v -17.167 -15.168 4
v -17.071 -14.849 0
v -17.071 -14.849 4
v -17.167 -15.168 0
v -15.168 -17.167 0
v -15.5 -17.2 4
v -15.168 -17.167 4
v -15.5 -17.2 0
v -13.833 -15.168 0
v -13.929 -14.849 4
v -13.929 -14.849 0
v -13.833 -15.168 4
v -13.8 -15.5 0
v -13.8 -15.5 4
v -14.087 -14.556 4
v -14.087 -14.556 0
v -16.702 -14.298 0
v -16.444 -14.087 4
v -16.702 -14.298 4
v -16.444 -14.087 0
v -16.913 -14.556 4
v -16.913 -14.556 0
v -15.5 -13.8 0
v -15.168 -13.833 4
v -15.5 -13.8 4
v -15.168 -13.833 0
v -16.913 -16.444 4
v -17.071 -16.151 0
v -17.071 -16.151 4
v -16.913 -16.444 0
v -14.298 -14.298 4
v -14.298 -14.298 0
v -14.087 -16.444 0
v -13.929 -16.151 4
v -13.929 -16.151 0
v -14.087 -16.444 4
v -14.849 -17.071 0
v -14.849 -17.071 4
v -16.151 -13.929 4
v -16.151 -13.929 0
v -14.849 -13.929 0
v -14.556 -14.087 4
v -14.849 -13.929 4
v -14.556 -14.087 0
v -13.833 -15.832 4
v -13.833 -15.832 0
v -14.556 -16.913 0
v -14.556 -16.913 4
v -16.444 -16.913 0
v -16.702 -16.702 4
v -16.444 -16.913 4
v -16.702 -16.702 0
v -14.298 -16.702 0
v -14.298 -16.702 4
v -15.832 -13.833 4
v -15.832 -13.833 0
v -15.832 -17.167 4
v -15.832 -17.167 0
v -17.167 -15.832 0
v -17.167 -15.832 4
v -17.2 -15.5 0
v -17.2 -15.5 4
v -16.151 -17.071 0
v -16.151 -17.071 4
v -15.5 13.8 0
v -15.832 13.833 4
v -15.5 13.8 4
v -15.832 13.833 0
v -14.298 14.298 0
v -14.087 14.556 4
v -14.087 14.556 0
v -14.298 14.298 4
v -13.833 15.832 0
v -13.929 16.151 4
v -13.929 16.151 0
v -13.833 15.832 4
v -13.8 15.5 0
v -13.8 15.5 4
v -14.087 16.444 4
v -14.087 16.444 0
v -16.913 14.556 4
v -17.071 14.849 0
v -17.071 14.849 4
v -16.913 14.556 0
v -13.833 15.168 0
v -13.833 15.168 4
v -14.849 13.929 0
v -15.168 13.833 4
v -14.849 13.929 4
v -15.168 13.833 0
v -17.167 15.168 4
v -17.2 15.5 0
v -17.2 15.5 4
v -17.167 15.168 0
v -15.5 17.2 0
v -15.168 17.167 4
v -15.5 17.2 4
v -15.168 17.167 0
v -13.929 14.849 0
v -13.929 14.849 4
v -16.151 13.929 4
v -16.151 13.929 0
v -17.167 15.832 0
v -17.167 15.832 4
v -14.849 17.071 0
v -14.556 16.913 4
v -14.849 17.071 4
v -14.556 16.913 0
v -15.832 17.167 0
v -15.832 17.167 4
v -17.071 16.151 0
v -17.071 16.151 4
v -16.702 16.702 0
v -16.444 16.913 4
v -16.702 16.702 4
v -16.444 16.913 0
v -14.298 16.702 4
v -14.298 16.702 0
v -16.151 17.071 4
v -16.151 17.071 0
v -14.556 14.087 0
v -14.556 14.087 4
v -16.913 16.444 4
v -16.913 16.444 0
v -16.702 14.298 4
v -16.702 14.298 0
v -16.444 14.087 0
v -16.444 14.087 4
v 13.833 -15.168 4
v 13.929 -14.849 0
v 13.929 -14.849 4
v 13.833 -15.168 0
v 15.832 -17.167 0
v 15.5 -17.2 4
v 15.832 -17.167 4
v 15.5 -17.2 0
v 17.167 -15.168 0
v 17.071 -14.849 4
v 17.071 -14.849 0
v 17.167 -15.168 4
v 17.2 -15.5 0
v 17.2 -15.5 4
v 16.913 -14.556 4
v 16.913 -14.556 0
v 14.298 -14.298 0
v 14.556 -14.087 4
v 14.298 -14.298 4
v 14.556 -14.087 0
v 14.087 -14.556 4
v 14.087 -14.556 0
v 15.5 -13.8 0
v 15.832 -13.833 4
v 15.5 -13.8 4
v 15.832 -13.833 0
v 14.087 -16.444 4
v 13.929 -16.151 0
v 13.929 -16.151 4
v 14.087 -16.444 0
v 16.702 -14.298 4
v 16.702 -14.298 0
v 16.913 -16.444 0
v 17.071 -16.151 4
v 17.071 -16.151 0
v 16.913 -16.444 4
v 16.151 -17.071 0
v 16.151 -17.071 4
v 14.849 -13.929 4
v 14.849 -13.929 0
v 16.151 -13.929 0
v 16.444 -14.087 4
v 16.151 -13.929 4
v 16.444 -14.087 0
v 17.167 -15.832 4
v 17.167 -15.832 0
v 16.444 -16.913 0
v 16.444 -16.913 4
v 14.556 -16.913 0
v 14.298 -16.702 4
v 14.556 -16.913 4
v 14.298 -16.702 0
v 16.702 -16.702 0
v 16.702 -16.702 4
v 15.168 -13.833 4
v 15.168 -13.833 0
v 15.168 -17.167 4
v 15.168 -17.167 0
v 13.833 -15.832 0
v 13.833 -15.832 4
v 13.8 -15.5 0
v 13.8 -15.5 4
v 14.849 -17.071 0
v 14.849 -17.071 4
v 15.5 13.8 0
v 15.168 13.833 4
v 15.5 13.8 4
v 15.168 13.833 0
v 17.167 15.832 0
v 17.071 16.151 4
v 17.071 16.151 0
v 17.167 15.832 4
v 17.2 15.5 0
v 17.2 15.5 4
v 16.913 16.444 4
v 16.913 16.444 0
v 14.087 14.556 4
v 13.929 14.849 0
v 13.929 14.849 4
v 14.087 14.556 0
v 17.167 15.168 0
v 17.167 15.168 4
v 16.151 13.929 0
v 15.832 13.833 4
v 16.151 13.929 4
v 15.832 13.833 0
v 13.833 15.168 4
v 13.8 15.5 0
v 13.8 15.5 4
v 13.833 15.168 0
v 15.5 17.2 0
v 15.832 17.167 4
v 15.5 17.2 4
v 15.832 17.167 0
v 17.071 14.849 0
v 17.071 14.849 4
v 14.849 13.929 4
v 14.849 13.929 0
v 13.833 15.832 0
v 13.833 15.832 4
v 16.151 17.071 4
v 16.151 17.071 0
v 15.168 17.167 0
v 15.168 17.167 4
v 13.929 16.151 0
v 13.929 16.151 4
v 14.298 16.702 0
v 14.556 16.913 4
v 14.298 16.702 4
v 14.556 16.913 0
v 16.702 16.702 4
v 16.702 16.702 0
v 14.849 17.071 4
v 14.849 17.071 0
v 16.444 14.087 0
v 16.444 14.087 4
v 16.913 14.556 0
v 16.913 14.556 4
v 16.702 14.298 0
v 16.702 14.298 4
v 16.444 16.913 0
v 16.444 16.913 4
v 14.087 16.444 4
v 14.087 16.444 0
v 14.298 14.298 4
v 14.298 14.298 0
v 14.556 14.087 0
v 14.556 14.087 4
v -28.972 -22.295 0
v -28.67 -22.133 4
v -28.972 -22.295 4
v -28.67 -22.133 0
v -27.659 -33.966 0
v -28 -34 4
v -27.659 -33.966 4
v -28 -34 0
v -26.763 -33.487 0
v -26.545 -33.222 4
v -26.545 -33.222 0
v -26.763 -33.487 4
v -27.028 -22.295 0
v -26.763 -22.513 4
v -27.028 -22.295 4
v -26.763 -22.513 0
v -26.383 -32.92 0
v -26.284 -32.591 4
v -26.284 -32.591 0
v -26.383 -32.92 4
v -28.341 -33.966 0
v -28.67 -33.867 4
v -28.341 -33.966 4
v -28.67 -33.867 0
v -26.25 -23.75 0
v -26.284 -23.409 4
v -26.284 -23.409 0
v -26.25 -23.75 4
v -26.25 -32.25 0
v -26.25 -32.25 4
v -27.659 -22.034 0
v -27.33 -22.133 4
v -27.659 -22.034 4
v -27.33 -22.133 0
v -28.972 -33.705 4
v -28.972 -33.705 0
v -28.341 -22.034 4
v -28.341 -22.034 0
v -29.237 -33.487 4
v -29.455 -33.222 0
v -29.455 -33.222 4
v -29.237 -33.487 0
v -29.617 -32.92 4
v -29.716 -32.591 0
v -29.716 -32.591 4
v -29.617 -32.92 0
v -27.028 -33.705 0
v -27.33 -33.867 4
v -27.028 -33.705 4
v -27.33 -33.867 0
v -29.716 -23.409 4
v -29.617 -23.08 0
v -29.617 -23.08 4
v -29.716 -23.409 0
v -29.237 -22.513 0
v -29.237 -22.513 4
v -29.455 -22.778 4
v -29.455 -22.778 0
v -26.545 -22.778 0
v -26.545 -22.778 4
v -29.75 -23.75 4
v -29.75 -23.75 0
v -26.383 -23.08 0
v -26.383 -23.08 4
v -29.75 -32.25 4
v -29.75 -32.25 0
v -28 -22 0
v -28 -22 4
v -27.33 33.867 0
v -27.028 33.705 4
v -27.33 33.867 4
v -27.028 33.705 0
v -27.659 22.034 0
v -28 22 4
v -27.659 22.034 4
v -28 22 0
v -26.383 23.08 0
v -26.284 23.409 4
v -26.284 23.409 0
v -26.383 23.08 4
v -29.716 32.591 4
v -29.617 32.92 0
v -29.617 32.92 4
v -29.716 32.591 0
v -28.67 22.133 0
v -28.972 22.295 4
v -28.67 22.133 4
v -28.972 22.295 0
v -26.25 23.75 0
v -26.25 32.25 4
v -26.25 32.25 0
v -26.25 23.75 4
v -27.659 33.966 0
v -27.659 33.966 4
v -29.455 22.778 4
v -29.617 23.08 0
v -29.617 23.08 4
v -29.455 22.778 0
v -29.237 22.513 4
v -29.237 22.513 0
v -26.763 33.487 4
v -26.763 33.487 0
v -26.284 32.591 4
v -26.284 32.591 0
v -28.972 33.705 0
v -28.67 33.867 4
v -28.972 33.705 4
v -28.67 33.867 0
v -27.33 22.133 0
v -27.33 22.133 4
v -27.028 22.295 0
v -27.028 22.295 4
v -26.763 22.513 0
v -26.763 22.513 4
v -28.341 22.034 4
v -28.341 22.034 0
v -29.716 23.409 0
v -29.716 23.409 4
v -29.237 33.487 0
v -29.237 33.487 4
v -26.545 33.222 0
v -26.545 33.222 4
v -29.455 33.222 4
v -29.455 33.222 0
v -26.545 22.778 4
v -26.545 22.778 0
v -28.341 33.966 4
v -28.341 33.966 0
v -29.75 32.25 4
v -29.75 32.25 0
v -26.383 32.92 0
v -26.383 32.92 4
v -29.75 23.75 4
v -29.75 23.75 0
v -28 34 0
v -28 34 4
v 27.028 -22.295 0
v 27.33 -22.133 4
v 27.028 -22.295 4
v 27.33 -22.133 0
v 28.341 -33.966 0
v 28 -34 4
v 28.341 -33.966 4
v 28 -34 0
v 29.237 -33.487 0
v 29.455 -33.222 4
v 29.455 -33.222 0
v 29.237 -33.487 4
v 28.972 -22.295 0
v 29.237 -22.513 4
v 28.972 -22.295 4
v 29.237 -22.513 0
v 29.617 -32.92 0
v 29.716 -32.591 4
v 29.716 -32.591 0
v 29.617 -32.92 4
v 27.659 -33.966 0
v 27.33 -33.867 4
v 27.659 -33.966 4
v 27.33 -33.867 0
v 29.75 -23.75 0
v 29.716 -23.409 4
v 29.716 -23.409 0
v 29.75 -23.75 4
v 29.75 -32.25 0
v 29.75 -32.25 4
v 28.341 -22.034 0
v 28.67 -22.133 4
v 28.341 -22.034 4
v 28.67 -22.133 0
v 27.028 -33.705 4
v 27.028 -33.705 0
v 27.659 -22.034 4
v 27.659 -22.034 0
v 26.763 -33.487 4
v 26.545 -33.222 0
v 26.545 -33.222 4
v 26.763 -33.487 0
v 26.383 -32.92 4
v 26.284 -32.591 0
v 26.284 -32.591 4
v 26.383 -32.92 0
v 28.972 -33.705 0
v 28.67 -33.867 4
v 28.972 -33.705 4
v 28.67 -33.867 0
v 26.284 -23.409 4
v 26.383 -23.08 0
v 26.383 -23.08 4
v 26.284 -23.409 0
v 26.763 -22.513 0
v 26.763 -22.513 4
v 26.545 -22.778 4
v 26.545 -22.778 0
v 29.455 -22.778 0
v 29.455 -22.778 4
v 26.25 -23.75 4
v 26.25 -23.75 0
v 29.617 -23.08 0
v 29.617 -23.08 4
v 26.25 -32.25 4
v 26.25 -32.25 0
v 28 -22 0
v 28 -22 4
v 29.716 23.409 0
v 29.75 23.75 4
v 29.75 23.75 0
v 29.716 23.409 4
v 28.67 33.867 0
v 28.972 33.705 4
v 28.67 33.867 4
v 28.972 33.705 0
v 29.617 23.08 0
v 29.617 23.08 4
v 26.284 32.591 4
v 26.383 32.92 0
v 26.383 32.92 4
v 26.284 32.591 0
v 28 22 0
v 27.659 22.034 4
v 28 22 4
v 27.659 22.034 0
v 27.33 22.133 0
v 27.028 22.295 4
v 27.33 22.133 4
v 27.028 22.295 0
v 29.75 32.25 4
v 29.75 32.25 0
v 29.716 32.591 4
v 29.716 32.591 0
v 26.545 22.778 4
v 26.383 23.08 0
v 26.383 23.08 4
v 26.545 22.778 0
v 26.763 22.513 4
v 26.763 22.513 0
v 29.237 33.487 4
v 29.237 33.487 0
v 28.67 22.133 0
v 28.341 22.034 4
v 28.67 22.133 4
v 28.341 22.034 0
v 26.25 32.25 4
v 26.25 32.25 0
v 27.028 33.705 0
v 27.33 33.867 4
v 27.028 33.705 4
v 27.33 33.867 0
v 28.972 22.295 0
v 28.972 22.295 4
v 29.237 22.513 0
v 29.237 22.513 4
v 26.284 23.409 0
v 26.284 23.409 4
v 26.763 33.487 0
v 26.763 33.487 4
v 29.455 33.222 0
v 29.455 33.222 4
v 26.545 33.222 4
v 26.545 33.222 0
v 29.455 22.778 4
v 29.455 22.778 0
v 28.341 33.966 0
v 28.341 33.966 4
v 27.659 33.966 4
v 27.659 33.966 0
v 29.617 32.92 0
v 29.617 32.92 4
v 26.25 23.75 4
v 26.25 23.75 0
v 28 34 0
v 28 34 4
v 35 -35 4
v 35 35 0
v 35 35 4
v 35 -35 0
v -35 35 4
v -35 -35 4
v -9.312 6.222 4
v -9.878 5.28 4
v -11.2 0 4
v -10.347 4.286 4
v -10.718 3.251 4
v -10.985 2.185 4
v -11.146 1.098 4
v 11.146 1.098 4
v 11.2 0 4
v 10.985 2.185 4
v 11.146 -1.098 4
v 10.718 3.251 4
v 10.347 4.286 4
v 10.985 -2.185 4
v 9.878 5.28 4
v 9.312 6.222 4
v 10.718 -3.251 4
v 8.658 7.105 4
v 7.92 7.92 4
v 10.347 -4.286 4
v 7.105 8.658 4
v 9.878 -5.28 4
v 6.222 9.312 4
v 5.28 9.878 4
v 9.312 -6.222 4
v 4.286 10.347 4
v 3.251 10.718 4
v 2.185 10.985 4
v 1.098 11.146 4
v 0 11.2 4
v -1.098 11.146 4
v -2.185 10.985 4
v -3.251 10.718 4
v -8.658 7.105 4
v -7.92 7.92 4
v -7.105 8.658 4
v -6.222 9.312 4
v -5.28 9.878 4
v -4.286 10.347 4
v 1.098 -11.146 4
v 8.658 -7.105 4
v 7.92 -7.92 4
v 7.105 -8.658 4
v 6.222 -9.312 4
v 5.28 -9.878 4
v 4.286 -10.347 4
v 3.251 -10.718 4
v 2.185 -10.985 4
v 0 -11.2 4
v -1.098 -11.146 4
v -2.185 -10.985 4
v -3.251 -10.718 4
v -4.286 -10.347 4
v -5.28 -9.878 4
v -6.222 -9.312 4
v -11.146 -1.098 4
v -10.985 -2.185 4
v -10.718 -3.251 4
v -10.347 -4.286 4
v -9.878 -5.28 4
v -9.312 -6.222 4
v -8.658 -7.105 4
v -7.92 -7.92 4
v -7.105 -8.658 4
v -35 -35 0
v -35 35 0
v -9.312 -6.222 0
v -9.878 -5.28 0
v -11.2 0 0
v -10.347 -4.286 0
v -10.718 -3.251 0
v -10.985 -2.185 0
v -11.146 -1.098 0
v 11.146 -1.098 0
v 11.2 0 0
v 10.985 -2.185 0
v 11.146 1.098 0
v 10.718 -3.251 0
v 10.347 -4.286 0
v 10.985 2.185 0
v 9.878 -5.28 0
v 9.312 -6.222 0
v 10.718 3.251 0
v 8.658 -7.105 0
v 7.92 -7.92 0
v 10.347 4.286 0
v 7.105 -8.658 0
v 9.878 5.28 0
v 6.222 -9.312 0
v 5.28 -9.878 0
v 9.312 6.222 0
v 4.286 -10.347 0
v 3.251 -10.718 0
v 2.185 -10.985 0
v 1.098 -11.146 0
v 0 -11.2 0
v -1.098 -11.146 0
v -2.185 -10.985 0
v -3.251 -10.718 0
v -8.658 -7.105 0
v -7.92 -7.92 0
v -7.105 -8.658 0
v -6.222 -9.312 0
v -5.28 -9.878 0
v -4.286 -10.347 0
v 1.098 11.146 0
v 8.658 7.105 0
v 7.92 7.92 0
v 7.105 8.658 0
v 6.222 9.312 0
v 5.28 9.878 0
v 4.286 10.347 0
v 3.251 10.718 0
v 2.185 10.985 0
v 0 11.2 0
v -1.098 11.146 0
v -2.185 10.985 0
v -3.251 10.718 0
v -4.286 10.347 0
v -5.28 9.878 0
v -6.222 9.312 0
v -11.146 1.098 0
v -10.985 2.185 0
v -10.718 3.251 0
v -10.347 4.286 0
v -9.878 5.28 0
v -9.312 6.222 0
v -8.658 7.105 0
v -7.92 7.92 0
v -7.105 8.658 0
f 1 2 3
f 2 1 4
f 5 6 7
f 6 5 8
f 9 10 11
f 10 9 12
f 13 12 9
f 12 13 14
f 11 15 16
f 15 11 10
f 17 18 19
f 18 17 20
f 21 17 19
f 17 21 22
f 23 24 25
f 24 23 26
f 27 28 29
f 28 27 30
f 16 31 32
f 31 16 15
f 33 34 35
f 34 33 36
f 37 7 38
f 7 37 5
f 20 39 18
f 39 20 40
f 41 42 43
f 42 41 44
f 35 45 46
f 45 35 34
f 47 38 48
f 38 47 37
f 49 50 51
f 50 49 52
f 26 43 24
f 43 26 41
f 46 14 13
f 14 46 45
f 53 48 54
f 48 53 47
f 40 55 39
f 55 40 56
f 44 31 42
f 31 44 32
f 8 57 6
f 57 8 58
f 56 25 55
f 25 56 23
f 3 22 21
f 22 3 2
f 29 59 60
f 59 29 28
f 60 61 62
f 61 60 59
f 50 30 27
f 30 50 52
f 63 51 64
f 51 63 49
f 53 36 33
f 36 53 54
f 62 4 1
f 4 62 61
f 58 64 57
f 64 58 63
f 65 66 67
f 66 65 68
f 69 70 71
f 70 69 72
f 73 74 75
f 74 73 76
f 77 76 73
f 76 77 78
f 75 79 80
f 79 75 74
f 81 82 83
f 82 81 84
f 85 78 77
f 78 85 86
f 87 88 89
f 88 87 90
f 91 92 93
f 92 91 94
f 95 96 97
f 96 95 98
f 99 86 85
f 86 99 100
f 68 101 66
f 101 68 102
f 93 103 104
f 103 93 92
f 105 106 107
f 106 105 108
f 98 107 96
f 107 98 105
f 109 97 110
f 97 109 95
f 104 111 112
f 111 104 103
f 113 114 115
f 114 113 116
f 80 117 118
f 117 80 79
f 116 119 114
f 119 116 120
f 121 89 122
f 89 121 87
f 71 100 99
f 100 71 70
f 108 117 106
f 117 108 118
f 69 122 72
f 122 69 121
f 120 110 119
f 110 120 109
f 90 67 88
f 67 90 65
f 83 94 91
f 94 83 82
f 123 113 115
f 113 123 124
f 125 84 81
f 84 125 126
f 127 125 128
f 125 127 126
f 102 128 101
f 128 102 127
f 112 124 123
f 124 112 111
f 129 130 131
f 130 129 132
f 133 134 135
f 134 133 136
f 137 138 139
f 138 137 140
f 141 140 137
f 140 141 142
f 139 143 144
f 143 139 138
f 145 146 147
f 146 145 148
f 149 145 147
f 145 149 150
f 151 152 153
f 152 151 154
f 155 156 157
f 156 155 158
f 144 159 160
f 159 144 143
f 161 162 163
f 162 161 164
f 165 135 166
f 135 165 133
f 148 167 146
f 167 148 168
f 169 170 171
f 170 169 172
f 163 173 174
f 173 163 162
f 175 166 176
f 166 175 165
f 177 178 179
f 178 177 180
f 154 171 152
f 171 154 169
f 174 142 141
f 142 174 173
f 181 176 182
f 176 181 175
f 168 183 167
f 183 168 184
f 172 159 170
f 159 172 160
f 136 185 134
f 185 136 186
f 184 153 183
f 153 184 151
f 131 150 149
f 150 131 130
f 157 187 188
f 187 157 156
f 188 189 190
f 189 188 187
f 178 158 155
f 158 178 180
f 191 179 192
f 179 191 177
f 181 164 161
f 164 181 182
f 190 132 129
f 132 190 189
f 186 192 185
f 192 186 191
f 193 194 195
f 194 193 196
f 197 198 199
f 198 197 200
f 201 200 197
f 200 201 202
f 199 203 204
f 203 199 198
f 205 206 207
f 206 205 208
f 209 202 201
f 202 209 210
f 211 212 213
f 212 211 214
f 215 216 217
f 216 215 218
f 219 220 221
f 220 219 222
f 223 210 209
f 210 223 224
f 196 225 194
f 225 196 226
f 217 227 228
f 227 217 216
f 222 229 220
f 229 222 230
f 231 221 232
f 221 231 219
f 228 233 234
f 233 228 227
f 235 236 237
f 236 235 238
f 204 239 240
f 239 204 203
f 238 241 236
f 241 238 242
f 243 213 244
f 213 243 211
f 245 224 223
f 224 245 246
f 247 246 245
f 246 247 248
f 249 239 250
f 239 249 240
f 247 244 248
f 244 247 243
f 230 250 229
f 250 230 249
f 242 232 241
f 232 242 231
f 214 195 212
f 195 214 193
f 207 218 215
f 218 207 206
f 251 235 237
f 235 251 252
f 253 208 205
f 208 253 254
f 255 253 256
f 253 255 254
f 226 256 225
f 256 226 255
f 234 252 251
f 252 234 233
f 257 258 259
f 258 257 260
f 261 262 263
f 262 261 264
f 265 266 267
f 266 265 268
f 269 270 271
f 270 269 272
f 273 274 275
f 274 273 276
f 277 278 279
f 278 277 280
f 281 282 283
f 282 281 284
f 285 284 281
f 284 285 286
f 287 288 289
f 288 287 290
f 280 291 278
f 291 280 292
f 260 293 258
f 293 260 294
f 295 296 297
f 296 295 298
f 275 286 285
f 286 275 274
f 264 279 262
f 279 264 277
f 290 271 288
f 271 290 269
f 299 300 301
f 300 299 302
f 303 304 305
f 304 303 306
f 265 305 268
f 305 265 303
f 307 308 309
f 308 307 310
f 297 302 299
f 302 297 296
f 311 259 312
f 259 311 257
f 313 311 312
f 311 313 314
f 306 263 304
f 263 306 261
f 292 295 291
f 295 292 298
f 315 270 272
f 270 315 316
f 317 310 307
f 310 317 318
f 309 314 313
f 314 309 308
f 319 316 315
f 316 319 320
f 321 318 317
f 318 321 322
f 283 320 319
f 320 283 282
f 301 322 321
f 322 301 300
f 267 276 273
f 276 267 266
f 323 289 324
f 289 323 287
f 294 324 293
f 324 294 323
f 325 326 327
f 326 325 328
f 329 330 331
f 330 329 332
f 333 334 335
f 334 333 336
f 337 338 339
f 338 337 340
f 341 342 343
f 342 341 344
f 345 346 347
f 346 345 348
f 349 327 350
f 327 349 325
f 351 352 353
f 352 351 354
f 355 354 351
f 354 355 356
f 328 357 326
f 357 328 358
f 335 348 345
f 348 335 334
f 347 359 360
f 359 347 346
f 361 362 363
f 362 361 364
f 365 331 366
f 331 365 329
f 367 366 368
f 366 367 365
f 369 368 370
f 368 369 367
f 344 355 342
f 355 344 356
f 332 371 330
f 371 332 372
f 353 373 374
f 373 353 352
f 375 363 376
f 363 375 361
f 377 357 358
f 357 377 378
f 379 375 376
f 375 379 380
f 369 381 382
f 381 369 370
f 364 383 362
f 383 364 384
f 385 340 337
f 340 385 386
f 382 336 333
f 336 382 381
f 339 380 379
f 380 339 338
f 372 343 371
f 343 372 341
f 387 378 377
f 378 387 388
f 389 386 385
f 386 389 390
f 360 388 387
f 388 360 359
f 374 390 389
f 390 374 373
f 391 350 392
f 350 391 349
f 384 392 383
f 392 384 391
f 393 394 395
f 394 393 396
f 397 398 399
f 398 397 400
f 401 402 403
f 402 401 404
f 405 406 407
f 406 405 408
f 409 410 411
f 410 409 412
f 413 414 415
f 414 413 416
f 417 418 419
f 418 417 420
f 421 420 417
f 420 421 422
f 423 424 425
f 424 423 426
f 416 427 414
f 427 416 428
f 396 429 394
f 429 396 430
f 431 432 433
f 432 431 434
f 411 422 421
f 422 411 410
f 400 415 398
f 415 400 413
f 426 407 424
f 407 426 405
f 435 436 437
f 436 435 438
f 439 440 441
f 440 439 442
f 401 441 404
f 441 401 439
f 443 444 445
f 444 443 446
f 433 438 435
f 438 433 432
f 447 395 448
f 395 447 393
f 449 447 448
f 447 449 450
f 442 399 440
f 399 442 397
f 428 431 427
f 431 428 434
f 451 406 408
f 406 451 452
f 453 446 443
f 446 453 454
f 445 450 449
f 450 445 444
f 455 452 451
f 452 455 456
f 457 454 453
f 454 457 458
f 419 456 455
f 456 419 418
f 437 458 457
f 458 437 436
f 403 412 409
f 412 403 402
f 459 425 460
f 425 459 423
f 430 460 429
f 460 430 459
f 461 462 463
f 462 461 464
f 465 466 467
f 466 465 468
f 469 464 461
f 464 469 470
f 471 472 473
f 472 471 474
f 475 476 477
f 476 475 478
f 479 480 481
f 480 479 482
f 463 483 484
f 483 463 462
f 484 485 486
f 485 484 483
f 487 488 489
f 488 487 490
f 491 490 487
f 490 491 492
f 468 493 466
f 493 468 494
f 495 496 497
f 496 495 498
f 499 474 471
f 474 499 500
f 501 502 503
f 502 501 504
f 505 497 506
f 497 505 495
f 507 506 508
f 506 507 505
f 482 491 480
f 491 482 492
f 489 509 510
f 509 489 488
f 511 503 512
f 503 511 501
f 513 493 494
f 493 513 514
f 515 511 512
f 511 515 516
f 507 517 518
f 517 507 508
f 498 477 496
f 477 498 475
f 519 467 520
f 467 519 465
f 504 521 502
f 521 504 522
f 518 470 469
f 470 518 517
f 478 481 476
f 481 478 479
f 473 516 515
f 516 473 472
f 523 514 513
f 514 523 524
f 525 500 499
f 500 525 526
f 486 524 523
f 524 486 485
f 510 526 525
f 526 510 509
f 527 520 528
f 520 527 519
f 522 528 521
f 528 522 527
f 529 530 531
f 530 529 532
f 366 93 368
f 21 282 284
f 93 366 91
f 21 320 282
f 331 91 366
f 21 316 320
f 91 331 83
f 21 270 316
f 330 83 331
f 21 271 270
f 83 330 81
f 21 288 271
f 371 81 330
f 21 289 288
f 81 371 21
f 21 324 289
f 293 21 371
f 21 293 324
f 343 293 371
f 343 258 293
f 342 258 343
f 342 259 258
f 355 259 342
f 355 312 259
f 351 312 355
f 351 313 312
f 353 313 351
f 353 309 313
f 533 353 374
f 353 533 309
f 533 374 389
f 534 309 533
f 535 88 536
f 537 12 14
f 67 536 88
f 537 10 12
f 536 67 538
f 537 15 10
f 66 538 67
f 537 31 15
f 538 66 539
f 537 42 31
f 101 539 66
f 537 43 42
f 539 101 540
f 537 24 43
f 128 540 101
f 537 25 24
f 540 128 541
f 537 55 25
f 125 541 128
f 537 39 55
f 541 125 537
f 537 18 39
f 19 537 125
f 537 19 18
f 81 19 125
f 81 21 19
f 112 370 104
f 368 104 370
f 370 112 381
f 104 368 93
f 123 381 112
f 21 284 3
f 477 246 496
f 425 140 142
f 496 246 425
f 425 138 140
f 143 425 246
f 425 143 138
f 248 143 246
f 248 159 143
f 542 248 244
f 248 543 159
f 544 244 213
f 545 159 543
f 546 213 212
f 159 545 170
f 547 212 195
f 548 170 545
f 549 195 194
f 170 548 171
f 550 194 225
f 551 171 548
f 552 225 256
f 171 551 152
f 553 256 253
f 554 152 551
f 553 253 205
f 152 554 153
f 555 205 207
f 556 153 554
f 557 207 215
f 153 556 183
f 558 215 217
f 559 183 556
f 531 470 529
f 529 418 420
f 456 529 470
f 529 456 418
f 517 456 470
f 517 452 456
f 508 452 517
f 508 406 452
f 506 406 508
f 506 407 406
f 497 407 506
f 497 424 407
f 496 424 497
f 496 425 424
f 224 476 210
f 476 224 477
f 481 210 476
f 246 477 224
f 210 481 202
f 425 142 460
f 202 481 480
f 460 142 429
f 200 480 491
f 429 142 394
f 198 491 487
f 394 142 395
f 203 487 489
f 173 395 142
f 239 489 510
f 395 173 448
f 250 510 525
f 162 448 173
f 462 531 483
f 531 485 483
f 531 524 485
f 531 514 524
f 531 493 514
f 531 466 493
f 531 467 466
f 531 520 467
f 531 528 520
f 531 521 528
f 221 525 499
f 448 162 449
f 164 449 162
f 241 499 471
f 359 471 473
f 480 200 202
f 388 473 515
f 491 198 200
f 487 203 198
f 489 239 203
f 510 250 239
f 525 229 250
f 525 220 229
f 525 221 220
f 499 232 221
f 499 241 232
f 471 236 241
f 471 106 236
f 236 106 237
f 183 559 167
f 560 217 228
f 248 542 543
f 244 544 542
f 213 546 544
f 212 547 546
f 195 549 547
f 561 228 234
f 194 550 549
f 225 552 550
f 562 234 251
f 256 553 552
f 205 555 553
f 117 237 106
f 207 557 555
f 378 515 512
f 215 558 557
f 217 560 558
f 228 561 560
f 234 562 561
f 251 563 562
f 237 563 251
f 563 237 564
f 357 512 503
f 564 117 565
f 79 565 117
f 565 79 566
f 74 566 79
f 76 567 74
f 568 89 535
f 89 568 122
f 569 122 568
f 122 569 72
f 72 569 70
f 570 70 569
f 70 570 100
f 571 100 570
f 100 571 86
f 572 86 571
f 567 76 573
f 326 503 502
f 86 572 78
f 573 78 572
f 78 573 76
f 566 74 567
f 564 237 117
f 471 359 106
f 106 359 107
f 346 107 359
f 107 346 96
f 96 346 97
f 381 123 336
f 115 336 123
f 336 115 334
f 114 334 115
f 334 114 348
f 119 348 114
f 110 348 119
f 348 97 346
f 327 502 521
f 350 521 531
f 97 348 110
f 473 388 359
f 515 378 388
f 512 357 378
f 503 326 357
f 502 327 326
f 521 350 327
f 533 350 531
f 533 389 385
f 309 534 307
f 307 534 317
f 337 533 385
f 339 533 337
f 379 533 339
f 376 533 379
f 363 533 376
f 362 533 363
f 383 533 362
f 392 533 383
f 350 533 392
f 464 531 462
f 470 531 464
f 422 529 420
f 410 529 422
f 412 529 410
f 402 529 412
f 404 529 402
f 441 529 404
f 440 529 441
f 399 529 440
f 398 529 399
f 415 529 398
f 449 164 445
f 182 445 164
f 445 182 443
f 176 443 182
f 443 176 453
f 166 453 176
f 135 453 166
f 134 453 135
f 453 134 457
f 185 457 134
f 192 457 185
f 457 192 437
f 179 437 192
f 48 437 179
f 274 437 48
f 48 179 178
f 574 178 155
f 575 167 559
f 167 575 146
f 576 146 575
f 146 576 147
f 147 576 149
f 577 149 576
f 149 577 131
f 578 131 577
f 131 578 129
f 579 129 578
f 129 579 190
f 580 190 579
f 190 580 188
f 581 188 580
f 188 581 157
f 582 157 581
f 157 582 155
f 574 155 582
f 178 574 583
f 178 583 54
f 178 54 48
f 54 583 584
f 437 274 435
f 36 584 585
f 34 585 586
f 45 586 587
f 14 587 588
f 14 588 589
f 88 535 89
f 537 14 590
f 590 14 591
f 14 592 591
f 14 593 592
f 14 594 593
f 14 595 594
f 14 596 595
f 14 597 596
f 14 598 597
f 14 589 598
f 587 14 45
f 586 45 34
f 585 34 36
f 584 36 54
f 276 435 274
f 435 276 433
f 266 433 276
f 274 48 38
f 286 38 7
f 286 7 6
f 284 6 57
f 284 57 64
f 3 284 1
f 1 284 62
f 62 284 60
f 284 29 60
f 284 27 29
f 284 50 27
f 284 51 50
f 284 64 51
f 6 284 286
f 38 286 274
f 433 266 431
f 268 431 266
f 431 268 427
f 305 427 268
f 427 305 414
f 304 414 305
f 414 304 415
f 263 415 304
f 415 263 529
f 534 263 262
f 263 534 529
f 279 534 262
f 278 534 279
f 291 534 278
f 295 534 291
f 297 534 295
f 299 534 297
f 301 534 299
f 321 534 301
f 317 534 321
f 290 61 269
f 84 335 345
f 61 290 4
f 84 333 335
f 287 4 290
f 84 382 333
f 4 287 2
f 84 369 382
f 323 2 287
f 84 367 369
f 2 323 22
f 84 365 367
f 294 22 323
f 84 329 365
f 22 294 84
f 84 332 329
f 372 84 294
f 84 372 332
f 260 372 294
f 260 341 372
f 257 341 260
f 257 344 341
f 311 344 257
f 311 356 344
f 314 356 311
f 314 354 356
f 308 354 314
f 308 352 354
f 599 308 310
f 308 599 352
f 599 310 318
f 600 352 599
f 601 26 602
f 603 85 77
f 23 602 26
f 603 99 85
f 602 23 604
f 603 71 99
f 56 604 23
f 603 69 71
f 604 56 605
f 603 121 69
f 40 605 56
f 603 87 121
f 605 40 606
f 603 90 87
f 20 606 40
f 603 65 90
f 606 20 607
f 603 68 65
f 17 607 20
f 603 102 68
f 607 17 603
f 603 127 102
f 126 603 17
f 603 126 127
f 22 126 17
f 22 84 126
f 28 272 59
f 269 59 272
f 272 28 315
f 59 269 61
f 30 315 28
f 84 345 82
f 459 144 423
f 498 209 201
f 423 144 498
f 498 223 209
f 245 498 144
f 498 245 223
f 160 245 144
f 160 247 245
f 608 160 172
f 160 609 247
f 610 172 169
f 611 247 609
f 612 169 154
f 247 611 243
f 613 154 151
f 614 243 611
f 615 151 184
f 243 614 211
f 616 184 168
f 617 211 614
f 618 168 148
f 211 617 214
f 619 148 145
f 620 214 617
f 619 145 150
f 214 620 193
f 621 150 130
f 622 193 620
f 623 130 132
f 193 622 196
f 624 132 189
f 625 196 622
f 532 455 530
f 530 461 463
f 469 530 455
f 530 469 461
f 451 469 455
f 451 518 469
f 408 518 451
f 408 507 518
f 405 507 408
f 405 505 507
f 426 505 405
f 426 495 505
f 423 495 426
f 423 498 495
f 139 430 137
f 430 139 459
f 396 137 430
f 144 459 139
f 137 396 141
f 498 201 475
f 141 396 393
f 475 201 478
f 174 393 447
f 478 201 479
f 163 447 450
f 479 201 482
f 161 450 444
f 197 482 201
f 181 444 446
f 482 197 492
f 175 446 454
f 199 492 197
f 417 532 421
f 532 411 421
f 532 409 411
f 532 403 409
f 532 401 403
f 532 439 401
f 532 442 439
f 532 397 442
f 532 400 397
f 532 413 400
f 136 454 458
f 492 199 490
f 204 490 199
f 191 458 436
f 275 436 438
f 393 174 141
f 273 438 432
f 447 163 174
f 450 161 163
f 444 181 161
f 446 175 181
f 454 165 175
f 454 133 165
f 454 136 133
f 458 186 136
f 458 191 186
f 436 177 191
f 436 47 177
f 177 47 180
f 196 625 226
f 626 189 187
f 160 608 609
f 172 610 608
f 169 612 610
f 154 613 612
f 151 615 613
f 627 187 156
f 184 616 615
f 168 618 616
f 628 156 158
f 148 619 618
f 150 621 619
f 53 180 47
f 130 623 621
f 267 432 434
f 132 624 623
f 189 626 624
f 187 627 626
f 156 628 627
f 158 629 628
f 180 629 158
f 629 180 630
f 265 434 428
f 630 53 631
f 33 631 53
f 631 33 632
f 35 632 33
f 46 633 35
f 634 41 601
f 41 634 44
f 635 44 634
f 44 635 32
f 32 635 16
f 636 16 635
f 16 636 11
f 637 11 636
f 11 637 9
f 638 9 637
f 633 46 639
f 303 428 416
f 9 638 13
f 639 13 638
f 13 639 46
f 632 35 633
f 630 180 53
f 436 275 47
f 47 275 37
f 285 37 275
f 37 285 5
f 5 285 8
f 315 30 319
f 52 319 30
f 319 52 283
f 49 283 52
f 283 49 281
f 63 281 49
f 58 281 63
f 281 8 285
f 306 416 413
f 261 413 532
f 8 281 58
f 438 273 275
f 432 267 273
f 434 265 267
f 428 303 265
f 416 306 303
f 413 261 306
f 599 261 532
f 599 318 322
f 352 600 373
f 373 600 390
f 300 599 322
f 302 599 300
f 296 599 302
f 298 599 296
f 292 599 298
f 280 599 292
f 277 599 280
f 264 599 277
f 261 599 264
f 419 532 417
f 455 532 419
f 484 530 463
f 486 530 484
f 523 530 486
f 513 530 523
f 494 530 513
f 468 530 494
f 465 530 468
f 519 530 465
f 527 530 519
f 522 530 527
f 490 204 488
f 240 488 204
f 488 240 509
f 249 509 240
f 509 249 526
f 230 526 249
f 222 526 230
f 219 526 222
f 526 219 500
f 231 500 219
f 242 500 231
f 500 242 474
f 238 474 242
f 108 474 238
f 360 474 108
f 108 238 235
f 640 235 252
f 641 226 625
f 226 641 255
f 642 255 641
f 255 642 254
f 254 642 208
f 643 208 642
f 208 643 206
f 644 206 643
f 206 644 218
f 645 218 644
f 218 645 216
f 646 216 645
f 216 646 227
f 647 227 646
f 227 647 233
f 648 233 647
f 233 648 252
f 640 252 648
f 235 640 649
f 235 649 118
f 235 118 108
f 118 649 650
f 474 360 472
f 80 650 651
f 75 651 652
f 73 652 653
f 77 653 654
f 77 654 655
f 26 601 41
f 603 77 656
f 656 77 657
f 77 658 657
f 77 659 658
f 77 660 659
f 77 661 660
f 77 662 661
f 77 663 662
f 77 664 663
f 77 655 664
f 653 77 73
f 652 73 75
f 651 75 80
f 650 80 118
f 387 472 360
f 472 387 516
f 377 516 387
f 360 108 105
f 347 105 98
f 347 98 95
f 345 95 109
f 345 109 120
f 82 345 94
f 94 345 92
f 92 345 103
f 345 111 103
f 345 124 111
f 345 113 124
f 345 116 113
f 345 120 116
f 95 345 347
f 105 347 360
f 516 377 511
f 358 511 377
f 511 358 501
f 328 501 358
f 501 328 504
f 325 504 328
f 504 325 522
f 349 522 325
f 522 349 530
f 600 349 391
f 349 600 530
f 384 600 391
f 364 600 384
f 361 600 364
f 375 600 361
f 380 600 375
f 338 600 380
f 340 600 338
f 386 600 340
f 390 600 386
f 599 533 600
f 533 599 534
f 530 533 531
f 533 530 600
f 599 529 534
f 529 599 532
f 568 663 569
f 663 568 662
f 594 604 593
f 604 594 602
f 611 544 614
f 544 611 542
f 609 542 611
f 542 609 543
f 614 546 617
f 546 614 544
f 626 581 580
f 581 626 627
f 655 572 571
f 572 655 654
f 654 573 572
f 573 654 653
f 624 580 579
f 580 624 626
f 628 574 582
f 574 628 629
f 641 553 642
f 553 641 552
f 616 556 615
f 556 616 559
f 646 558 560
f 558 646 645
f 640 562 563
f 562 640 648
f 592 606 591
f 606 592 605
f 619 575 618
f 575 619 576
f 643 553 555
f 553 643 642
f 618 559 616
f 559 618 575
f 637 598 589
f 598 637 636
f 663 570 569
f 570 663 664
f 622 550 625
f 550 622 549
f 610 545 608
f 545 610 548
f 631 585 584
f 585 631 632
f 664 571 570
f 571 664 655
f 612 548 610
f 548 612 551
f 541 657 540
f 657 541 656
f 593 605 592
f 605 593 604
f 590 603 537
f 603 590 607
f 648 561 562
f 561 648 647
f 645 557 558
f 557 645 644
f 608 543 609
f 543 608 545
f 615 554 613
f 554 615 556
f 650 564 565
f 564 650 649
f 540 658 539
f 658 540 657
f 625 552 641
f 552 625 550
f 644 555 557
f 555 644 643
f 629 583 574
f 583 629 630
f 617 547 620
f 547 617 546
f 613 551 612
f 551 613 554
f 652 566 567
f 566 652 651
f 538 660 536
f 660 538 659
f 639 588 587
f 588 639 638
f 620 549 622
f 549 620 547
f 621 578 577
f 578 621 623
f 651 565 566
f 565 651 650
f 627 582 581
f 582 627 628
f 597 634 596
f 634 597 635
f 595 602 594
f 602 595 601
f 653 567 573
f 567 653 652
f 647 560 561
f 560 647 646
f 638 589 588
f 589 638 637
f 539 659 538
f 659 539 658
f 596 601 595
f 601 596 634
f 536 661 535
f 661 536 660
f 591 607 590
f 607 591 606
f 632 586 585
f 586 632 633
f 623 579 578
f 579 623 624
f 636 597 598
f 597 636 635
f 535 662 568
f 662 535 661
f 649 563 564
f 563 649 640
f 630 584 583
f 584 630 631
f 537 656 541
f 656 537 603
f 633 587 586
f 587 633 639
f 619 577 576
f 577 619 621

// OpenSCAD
// motor_mount_bracket.scad
// Flat bracket for NEMA17 mount with slotted frame attachment holes.
//
// Orientation: bracket is a flat plate, print with Z = thickness direction.
// Motor face is the -Z face (bottom when printing) so pilot pocket is on the bed side.
// All holes print vertically with no support needed.
//
// Slot axis: Y (elongated in Y).
// Belt tension direction: slide bracket in +Y to increase center distance.
// Frame bolts at fixed Y positions pass through the Y-oriented slots.
// Tighten frame bolts to lock bracket in place after tensioning.
//
// Hardware needed:
//   4x M3 screws into motor face (NEMA17 M3 tapped holes)
//   4x M3 bolts + nuts for frame attachment through the slots

include <rollers_params.scad>

module motor_mount_bracket(params = default_params()) {
  validate(params);

  w  = pget(params, "provisional_bracket_width_mm");
  h  = pget(params, "provisional_bracket_height_mm");
  t  = pget(params, "provisional_bracket_thickness_mm");

  pilot_d   = pget(params, "provisional_nema17_pilot_clear_d");
  hole_sp   = pget(params, "provisional_nema17_hole_spacing_mm");
  m3_d      = pget(params, "provisional_motor_m3_clear_d");

  slot_w    = pget(params, "provisional_frame_slot_w");
  slot_l    = pget(params, "provisional_frame_slot_l");
  slot_cx   = pget(params, "provisional_frame_slot_cx");
  slot_cy   = pget(params, "provisional_frame_slot_cy");

  slot_half = (slot_l - slot_w) / 2;

  difference() {
    // Main plate, centered at origin in XY
    translate([-w/2, -h/2, 0])
      cube([w, h, t]);

    // Pilot boss and shaft clearance at center (through)
    translate([0, 0, -0.1])
      cylinder(h = t + 0.2, d = pilot_d, $fn = 64);

    // NEMA17 M3 motor mounting holes
    for (xi = [-1, 1])
      for (yi = [-1, 1])
        translate([xi * hole_sp/2, yi * hole_sp/2, -0.1])
          cylinder(h = t + 0.2, d = m3_d, $fn = 32);

    // Frame attachment slots, Y-oriented, one per corner quadrant
    for (xi = [-1, 1])
      for (yi = [-1, 1])
        translate([xi * slot_cx, yi * slot_cy, -0.1])
          hull() {
            translate([0, -slot_half, 0])
              cylinder(h = t + 0.2, d = slot_w, $fn = 32);
            translate([0,  slot_half, 0])
              cylinder(h = t + 0.2, d = slot_w, $fn = 32);
          }
  }
}

build_target = is_undef(build_target) ? "model" : build_target;
params = is_undef(params) ? default_params() : params;

if (build_target == "model") {
  motor_mount_bracket(params);
} else if (build_target == "validate") {
  validate(params);
  cube([1, 1, 1]);
} else {
  motor_mount_bracket(params);
}
